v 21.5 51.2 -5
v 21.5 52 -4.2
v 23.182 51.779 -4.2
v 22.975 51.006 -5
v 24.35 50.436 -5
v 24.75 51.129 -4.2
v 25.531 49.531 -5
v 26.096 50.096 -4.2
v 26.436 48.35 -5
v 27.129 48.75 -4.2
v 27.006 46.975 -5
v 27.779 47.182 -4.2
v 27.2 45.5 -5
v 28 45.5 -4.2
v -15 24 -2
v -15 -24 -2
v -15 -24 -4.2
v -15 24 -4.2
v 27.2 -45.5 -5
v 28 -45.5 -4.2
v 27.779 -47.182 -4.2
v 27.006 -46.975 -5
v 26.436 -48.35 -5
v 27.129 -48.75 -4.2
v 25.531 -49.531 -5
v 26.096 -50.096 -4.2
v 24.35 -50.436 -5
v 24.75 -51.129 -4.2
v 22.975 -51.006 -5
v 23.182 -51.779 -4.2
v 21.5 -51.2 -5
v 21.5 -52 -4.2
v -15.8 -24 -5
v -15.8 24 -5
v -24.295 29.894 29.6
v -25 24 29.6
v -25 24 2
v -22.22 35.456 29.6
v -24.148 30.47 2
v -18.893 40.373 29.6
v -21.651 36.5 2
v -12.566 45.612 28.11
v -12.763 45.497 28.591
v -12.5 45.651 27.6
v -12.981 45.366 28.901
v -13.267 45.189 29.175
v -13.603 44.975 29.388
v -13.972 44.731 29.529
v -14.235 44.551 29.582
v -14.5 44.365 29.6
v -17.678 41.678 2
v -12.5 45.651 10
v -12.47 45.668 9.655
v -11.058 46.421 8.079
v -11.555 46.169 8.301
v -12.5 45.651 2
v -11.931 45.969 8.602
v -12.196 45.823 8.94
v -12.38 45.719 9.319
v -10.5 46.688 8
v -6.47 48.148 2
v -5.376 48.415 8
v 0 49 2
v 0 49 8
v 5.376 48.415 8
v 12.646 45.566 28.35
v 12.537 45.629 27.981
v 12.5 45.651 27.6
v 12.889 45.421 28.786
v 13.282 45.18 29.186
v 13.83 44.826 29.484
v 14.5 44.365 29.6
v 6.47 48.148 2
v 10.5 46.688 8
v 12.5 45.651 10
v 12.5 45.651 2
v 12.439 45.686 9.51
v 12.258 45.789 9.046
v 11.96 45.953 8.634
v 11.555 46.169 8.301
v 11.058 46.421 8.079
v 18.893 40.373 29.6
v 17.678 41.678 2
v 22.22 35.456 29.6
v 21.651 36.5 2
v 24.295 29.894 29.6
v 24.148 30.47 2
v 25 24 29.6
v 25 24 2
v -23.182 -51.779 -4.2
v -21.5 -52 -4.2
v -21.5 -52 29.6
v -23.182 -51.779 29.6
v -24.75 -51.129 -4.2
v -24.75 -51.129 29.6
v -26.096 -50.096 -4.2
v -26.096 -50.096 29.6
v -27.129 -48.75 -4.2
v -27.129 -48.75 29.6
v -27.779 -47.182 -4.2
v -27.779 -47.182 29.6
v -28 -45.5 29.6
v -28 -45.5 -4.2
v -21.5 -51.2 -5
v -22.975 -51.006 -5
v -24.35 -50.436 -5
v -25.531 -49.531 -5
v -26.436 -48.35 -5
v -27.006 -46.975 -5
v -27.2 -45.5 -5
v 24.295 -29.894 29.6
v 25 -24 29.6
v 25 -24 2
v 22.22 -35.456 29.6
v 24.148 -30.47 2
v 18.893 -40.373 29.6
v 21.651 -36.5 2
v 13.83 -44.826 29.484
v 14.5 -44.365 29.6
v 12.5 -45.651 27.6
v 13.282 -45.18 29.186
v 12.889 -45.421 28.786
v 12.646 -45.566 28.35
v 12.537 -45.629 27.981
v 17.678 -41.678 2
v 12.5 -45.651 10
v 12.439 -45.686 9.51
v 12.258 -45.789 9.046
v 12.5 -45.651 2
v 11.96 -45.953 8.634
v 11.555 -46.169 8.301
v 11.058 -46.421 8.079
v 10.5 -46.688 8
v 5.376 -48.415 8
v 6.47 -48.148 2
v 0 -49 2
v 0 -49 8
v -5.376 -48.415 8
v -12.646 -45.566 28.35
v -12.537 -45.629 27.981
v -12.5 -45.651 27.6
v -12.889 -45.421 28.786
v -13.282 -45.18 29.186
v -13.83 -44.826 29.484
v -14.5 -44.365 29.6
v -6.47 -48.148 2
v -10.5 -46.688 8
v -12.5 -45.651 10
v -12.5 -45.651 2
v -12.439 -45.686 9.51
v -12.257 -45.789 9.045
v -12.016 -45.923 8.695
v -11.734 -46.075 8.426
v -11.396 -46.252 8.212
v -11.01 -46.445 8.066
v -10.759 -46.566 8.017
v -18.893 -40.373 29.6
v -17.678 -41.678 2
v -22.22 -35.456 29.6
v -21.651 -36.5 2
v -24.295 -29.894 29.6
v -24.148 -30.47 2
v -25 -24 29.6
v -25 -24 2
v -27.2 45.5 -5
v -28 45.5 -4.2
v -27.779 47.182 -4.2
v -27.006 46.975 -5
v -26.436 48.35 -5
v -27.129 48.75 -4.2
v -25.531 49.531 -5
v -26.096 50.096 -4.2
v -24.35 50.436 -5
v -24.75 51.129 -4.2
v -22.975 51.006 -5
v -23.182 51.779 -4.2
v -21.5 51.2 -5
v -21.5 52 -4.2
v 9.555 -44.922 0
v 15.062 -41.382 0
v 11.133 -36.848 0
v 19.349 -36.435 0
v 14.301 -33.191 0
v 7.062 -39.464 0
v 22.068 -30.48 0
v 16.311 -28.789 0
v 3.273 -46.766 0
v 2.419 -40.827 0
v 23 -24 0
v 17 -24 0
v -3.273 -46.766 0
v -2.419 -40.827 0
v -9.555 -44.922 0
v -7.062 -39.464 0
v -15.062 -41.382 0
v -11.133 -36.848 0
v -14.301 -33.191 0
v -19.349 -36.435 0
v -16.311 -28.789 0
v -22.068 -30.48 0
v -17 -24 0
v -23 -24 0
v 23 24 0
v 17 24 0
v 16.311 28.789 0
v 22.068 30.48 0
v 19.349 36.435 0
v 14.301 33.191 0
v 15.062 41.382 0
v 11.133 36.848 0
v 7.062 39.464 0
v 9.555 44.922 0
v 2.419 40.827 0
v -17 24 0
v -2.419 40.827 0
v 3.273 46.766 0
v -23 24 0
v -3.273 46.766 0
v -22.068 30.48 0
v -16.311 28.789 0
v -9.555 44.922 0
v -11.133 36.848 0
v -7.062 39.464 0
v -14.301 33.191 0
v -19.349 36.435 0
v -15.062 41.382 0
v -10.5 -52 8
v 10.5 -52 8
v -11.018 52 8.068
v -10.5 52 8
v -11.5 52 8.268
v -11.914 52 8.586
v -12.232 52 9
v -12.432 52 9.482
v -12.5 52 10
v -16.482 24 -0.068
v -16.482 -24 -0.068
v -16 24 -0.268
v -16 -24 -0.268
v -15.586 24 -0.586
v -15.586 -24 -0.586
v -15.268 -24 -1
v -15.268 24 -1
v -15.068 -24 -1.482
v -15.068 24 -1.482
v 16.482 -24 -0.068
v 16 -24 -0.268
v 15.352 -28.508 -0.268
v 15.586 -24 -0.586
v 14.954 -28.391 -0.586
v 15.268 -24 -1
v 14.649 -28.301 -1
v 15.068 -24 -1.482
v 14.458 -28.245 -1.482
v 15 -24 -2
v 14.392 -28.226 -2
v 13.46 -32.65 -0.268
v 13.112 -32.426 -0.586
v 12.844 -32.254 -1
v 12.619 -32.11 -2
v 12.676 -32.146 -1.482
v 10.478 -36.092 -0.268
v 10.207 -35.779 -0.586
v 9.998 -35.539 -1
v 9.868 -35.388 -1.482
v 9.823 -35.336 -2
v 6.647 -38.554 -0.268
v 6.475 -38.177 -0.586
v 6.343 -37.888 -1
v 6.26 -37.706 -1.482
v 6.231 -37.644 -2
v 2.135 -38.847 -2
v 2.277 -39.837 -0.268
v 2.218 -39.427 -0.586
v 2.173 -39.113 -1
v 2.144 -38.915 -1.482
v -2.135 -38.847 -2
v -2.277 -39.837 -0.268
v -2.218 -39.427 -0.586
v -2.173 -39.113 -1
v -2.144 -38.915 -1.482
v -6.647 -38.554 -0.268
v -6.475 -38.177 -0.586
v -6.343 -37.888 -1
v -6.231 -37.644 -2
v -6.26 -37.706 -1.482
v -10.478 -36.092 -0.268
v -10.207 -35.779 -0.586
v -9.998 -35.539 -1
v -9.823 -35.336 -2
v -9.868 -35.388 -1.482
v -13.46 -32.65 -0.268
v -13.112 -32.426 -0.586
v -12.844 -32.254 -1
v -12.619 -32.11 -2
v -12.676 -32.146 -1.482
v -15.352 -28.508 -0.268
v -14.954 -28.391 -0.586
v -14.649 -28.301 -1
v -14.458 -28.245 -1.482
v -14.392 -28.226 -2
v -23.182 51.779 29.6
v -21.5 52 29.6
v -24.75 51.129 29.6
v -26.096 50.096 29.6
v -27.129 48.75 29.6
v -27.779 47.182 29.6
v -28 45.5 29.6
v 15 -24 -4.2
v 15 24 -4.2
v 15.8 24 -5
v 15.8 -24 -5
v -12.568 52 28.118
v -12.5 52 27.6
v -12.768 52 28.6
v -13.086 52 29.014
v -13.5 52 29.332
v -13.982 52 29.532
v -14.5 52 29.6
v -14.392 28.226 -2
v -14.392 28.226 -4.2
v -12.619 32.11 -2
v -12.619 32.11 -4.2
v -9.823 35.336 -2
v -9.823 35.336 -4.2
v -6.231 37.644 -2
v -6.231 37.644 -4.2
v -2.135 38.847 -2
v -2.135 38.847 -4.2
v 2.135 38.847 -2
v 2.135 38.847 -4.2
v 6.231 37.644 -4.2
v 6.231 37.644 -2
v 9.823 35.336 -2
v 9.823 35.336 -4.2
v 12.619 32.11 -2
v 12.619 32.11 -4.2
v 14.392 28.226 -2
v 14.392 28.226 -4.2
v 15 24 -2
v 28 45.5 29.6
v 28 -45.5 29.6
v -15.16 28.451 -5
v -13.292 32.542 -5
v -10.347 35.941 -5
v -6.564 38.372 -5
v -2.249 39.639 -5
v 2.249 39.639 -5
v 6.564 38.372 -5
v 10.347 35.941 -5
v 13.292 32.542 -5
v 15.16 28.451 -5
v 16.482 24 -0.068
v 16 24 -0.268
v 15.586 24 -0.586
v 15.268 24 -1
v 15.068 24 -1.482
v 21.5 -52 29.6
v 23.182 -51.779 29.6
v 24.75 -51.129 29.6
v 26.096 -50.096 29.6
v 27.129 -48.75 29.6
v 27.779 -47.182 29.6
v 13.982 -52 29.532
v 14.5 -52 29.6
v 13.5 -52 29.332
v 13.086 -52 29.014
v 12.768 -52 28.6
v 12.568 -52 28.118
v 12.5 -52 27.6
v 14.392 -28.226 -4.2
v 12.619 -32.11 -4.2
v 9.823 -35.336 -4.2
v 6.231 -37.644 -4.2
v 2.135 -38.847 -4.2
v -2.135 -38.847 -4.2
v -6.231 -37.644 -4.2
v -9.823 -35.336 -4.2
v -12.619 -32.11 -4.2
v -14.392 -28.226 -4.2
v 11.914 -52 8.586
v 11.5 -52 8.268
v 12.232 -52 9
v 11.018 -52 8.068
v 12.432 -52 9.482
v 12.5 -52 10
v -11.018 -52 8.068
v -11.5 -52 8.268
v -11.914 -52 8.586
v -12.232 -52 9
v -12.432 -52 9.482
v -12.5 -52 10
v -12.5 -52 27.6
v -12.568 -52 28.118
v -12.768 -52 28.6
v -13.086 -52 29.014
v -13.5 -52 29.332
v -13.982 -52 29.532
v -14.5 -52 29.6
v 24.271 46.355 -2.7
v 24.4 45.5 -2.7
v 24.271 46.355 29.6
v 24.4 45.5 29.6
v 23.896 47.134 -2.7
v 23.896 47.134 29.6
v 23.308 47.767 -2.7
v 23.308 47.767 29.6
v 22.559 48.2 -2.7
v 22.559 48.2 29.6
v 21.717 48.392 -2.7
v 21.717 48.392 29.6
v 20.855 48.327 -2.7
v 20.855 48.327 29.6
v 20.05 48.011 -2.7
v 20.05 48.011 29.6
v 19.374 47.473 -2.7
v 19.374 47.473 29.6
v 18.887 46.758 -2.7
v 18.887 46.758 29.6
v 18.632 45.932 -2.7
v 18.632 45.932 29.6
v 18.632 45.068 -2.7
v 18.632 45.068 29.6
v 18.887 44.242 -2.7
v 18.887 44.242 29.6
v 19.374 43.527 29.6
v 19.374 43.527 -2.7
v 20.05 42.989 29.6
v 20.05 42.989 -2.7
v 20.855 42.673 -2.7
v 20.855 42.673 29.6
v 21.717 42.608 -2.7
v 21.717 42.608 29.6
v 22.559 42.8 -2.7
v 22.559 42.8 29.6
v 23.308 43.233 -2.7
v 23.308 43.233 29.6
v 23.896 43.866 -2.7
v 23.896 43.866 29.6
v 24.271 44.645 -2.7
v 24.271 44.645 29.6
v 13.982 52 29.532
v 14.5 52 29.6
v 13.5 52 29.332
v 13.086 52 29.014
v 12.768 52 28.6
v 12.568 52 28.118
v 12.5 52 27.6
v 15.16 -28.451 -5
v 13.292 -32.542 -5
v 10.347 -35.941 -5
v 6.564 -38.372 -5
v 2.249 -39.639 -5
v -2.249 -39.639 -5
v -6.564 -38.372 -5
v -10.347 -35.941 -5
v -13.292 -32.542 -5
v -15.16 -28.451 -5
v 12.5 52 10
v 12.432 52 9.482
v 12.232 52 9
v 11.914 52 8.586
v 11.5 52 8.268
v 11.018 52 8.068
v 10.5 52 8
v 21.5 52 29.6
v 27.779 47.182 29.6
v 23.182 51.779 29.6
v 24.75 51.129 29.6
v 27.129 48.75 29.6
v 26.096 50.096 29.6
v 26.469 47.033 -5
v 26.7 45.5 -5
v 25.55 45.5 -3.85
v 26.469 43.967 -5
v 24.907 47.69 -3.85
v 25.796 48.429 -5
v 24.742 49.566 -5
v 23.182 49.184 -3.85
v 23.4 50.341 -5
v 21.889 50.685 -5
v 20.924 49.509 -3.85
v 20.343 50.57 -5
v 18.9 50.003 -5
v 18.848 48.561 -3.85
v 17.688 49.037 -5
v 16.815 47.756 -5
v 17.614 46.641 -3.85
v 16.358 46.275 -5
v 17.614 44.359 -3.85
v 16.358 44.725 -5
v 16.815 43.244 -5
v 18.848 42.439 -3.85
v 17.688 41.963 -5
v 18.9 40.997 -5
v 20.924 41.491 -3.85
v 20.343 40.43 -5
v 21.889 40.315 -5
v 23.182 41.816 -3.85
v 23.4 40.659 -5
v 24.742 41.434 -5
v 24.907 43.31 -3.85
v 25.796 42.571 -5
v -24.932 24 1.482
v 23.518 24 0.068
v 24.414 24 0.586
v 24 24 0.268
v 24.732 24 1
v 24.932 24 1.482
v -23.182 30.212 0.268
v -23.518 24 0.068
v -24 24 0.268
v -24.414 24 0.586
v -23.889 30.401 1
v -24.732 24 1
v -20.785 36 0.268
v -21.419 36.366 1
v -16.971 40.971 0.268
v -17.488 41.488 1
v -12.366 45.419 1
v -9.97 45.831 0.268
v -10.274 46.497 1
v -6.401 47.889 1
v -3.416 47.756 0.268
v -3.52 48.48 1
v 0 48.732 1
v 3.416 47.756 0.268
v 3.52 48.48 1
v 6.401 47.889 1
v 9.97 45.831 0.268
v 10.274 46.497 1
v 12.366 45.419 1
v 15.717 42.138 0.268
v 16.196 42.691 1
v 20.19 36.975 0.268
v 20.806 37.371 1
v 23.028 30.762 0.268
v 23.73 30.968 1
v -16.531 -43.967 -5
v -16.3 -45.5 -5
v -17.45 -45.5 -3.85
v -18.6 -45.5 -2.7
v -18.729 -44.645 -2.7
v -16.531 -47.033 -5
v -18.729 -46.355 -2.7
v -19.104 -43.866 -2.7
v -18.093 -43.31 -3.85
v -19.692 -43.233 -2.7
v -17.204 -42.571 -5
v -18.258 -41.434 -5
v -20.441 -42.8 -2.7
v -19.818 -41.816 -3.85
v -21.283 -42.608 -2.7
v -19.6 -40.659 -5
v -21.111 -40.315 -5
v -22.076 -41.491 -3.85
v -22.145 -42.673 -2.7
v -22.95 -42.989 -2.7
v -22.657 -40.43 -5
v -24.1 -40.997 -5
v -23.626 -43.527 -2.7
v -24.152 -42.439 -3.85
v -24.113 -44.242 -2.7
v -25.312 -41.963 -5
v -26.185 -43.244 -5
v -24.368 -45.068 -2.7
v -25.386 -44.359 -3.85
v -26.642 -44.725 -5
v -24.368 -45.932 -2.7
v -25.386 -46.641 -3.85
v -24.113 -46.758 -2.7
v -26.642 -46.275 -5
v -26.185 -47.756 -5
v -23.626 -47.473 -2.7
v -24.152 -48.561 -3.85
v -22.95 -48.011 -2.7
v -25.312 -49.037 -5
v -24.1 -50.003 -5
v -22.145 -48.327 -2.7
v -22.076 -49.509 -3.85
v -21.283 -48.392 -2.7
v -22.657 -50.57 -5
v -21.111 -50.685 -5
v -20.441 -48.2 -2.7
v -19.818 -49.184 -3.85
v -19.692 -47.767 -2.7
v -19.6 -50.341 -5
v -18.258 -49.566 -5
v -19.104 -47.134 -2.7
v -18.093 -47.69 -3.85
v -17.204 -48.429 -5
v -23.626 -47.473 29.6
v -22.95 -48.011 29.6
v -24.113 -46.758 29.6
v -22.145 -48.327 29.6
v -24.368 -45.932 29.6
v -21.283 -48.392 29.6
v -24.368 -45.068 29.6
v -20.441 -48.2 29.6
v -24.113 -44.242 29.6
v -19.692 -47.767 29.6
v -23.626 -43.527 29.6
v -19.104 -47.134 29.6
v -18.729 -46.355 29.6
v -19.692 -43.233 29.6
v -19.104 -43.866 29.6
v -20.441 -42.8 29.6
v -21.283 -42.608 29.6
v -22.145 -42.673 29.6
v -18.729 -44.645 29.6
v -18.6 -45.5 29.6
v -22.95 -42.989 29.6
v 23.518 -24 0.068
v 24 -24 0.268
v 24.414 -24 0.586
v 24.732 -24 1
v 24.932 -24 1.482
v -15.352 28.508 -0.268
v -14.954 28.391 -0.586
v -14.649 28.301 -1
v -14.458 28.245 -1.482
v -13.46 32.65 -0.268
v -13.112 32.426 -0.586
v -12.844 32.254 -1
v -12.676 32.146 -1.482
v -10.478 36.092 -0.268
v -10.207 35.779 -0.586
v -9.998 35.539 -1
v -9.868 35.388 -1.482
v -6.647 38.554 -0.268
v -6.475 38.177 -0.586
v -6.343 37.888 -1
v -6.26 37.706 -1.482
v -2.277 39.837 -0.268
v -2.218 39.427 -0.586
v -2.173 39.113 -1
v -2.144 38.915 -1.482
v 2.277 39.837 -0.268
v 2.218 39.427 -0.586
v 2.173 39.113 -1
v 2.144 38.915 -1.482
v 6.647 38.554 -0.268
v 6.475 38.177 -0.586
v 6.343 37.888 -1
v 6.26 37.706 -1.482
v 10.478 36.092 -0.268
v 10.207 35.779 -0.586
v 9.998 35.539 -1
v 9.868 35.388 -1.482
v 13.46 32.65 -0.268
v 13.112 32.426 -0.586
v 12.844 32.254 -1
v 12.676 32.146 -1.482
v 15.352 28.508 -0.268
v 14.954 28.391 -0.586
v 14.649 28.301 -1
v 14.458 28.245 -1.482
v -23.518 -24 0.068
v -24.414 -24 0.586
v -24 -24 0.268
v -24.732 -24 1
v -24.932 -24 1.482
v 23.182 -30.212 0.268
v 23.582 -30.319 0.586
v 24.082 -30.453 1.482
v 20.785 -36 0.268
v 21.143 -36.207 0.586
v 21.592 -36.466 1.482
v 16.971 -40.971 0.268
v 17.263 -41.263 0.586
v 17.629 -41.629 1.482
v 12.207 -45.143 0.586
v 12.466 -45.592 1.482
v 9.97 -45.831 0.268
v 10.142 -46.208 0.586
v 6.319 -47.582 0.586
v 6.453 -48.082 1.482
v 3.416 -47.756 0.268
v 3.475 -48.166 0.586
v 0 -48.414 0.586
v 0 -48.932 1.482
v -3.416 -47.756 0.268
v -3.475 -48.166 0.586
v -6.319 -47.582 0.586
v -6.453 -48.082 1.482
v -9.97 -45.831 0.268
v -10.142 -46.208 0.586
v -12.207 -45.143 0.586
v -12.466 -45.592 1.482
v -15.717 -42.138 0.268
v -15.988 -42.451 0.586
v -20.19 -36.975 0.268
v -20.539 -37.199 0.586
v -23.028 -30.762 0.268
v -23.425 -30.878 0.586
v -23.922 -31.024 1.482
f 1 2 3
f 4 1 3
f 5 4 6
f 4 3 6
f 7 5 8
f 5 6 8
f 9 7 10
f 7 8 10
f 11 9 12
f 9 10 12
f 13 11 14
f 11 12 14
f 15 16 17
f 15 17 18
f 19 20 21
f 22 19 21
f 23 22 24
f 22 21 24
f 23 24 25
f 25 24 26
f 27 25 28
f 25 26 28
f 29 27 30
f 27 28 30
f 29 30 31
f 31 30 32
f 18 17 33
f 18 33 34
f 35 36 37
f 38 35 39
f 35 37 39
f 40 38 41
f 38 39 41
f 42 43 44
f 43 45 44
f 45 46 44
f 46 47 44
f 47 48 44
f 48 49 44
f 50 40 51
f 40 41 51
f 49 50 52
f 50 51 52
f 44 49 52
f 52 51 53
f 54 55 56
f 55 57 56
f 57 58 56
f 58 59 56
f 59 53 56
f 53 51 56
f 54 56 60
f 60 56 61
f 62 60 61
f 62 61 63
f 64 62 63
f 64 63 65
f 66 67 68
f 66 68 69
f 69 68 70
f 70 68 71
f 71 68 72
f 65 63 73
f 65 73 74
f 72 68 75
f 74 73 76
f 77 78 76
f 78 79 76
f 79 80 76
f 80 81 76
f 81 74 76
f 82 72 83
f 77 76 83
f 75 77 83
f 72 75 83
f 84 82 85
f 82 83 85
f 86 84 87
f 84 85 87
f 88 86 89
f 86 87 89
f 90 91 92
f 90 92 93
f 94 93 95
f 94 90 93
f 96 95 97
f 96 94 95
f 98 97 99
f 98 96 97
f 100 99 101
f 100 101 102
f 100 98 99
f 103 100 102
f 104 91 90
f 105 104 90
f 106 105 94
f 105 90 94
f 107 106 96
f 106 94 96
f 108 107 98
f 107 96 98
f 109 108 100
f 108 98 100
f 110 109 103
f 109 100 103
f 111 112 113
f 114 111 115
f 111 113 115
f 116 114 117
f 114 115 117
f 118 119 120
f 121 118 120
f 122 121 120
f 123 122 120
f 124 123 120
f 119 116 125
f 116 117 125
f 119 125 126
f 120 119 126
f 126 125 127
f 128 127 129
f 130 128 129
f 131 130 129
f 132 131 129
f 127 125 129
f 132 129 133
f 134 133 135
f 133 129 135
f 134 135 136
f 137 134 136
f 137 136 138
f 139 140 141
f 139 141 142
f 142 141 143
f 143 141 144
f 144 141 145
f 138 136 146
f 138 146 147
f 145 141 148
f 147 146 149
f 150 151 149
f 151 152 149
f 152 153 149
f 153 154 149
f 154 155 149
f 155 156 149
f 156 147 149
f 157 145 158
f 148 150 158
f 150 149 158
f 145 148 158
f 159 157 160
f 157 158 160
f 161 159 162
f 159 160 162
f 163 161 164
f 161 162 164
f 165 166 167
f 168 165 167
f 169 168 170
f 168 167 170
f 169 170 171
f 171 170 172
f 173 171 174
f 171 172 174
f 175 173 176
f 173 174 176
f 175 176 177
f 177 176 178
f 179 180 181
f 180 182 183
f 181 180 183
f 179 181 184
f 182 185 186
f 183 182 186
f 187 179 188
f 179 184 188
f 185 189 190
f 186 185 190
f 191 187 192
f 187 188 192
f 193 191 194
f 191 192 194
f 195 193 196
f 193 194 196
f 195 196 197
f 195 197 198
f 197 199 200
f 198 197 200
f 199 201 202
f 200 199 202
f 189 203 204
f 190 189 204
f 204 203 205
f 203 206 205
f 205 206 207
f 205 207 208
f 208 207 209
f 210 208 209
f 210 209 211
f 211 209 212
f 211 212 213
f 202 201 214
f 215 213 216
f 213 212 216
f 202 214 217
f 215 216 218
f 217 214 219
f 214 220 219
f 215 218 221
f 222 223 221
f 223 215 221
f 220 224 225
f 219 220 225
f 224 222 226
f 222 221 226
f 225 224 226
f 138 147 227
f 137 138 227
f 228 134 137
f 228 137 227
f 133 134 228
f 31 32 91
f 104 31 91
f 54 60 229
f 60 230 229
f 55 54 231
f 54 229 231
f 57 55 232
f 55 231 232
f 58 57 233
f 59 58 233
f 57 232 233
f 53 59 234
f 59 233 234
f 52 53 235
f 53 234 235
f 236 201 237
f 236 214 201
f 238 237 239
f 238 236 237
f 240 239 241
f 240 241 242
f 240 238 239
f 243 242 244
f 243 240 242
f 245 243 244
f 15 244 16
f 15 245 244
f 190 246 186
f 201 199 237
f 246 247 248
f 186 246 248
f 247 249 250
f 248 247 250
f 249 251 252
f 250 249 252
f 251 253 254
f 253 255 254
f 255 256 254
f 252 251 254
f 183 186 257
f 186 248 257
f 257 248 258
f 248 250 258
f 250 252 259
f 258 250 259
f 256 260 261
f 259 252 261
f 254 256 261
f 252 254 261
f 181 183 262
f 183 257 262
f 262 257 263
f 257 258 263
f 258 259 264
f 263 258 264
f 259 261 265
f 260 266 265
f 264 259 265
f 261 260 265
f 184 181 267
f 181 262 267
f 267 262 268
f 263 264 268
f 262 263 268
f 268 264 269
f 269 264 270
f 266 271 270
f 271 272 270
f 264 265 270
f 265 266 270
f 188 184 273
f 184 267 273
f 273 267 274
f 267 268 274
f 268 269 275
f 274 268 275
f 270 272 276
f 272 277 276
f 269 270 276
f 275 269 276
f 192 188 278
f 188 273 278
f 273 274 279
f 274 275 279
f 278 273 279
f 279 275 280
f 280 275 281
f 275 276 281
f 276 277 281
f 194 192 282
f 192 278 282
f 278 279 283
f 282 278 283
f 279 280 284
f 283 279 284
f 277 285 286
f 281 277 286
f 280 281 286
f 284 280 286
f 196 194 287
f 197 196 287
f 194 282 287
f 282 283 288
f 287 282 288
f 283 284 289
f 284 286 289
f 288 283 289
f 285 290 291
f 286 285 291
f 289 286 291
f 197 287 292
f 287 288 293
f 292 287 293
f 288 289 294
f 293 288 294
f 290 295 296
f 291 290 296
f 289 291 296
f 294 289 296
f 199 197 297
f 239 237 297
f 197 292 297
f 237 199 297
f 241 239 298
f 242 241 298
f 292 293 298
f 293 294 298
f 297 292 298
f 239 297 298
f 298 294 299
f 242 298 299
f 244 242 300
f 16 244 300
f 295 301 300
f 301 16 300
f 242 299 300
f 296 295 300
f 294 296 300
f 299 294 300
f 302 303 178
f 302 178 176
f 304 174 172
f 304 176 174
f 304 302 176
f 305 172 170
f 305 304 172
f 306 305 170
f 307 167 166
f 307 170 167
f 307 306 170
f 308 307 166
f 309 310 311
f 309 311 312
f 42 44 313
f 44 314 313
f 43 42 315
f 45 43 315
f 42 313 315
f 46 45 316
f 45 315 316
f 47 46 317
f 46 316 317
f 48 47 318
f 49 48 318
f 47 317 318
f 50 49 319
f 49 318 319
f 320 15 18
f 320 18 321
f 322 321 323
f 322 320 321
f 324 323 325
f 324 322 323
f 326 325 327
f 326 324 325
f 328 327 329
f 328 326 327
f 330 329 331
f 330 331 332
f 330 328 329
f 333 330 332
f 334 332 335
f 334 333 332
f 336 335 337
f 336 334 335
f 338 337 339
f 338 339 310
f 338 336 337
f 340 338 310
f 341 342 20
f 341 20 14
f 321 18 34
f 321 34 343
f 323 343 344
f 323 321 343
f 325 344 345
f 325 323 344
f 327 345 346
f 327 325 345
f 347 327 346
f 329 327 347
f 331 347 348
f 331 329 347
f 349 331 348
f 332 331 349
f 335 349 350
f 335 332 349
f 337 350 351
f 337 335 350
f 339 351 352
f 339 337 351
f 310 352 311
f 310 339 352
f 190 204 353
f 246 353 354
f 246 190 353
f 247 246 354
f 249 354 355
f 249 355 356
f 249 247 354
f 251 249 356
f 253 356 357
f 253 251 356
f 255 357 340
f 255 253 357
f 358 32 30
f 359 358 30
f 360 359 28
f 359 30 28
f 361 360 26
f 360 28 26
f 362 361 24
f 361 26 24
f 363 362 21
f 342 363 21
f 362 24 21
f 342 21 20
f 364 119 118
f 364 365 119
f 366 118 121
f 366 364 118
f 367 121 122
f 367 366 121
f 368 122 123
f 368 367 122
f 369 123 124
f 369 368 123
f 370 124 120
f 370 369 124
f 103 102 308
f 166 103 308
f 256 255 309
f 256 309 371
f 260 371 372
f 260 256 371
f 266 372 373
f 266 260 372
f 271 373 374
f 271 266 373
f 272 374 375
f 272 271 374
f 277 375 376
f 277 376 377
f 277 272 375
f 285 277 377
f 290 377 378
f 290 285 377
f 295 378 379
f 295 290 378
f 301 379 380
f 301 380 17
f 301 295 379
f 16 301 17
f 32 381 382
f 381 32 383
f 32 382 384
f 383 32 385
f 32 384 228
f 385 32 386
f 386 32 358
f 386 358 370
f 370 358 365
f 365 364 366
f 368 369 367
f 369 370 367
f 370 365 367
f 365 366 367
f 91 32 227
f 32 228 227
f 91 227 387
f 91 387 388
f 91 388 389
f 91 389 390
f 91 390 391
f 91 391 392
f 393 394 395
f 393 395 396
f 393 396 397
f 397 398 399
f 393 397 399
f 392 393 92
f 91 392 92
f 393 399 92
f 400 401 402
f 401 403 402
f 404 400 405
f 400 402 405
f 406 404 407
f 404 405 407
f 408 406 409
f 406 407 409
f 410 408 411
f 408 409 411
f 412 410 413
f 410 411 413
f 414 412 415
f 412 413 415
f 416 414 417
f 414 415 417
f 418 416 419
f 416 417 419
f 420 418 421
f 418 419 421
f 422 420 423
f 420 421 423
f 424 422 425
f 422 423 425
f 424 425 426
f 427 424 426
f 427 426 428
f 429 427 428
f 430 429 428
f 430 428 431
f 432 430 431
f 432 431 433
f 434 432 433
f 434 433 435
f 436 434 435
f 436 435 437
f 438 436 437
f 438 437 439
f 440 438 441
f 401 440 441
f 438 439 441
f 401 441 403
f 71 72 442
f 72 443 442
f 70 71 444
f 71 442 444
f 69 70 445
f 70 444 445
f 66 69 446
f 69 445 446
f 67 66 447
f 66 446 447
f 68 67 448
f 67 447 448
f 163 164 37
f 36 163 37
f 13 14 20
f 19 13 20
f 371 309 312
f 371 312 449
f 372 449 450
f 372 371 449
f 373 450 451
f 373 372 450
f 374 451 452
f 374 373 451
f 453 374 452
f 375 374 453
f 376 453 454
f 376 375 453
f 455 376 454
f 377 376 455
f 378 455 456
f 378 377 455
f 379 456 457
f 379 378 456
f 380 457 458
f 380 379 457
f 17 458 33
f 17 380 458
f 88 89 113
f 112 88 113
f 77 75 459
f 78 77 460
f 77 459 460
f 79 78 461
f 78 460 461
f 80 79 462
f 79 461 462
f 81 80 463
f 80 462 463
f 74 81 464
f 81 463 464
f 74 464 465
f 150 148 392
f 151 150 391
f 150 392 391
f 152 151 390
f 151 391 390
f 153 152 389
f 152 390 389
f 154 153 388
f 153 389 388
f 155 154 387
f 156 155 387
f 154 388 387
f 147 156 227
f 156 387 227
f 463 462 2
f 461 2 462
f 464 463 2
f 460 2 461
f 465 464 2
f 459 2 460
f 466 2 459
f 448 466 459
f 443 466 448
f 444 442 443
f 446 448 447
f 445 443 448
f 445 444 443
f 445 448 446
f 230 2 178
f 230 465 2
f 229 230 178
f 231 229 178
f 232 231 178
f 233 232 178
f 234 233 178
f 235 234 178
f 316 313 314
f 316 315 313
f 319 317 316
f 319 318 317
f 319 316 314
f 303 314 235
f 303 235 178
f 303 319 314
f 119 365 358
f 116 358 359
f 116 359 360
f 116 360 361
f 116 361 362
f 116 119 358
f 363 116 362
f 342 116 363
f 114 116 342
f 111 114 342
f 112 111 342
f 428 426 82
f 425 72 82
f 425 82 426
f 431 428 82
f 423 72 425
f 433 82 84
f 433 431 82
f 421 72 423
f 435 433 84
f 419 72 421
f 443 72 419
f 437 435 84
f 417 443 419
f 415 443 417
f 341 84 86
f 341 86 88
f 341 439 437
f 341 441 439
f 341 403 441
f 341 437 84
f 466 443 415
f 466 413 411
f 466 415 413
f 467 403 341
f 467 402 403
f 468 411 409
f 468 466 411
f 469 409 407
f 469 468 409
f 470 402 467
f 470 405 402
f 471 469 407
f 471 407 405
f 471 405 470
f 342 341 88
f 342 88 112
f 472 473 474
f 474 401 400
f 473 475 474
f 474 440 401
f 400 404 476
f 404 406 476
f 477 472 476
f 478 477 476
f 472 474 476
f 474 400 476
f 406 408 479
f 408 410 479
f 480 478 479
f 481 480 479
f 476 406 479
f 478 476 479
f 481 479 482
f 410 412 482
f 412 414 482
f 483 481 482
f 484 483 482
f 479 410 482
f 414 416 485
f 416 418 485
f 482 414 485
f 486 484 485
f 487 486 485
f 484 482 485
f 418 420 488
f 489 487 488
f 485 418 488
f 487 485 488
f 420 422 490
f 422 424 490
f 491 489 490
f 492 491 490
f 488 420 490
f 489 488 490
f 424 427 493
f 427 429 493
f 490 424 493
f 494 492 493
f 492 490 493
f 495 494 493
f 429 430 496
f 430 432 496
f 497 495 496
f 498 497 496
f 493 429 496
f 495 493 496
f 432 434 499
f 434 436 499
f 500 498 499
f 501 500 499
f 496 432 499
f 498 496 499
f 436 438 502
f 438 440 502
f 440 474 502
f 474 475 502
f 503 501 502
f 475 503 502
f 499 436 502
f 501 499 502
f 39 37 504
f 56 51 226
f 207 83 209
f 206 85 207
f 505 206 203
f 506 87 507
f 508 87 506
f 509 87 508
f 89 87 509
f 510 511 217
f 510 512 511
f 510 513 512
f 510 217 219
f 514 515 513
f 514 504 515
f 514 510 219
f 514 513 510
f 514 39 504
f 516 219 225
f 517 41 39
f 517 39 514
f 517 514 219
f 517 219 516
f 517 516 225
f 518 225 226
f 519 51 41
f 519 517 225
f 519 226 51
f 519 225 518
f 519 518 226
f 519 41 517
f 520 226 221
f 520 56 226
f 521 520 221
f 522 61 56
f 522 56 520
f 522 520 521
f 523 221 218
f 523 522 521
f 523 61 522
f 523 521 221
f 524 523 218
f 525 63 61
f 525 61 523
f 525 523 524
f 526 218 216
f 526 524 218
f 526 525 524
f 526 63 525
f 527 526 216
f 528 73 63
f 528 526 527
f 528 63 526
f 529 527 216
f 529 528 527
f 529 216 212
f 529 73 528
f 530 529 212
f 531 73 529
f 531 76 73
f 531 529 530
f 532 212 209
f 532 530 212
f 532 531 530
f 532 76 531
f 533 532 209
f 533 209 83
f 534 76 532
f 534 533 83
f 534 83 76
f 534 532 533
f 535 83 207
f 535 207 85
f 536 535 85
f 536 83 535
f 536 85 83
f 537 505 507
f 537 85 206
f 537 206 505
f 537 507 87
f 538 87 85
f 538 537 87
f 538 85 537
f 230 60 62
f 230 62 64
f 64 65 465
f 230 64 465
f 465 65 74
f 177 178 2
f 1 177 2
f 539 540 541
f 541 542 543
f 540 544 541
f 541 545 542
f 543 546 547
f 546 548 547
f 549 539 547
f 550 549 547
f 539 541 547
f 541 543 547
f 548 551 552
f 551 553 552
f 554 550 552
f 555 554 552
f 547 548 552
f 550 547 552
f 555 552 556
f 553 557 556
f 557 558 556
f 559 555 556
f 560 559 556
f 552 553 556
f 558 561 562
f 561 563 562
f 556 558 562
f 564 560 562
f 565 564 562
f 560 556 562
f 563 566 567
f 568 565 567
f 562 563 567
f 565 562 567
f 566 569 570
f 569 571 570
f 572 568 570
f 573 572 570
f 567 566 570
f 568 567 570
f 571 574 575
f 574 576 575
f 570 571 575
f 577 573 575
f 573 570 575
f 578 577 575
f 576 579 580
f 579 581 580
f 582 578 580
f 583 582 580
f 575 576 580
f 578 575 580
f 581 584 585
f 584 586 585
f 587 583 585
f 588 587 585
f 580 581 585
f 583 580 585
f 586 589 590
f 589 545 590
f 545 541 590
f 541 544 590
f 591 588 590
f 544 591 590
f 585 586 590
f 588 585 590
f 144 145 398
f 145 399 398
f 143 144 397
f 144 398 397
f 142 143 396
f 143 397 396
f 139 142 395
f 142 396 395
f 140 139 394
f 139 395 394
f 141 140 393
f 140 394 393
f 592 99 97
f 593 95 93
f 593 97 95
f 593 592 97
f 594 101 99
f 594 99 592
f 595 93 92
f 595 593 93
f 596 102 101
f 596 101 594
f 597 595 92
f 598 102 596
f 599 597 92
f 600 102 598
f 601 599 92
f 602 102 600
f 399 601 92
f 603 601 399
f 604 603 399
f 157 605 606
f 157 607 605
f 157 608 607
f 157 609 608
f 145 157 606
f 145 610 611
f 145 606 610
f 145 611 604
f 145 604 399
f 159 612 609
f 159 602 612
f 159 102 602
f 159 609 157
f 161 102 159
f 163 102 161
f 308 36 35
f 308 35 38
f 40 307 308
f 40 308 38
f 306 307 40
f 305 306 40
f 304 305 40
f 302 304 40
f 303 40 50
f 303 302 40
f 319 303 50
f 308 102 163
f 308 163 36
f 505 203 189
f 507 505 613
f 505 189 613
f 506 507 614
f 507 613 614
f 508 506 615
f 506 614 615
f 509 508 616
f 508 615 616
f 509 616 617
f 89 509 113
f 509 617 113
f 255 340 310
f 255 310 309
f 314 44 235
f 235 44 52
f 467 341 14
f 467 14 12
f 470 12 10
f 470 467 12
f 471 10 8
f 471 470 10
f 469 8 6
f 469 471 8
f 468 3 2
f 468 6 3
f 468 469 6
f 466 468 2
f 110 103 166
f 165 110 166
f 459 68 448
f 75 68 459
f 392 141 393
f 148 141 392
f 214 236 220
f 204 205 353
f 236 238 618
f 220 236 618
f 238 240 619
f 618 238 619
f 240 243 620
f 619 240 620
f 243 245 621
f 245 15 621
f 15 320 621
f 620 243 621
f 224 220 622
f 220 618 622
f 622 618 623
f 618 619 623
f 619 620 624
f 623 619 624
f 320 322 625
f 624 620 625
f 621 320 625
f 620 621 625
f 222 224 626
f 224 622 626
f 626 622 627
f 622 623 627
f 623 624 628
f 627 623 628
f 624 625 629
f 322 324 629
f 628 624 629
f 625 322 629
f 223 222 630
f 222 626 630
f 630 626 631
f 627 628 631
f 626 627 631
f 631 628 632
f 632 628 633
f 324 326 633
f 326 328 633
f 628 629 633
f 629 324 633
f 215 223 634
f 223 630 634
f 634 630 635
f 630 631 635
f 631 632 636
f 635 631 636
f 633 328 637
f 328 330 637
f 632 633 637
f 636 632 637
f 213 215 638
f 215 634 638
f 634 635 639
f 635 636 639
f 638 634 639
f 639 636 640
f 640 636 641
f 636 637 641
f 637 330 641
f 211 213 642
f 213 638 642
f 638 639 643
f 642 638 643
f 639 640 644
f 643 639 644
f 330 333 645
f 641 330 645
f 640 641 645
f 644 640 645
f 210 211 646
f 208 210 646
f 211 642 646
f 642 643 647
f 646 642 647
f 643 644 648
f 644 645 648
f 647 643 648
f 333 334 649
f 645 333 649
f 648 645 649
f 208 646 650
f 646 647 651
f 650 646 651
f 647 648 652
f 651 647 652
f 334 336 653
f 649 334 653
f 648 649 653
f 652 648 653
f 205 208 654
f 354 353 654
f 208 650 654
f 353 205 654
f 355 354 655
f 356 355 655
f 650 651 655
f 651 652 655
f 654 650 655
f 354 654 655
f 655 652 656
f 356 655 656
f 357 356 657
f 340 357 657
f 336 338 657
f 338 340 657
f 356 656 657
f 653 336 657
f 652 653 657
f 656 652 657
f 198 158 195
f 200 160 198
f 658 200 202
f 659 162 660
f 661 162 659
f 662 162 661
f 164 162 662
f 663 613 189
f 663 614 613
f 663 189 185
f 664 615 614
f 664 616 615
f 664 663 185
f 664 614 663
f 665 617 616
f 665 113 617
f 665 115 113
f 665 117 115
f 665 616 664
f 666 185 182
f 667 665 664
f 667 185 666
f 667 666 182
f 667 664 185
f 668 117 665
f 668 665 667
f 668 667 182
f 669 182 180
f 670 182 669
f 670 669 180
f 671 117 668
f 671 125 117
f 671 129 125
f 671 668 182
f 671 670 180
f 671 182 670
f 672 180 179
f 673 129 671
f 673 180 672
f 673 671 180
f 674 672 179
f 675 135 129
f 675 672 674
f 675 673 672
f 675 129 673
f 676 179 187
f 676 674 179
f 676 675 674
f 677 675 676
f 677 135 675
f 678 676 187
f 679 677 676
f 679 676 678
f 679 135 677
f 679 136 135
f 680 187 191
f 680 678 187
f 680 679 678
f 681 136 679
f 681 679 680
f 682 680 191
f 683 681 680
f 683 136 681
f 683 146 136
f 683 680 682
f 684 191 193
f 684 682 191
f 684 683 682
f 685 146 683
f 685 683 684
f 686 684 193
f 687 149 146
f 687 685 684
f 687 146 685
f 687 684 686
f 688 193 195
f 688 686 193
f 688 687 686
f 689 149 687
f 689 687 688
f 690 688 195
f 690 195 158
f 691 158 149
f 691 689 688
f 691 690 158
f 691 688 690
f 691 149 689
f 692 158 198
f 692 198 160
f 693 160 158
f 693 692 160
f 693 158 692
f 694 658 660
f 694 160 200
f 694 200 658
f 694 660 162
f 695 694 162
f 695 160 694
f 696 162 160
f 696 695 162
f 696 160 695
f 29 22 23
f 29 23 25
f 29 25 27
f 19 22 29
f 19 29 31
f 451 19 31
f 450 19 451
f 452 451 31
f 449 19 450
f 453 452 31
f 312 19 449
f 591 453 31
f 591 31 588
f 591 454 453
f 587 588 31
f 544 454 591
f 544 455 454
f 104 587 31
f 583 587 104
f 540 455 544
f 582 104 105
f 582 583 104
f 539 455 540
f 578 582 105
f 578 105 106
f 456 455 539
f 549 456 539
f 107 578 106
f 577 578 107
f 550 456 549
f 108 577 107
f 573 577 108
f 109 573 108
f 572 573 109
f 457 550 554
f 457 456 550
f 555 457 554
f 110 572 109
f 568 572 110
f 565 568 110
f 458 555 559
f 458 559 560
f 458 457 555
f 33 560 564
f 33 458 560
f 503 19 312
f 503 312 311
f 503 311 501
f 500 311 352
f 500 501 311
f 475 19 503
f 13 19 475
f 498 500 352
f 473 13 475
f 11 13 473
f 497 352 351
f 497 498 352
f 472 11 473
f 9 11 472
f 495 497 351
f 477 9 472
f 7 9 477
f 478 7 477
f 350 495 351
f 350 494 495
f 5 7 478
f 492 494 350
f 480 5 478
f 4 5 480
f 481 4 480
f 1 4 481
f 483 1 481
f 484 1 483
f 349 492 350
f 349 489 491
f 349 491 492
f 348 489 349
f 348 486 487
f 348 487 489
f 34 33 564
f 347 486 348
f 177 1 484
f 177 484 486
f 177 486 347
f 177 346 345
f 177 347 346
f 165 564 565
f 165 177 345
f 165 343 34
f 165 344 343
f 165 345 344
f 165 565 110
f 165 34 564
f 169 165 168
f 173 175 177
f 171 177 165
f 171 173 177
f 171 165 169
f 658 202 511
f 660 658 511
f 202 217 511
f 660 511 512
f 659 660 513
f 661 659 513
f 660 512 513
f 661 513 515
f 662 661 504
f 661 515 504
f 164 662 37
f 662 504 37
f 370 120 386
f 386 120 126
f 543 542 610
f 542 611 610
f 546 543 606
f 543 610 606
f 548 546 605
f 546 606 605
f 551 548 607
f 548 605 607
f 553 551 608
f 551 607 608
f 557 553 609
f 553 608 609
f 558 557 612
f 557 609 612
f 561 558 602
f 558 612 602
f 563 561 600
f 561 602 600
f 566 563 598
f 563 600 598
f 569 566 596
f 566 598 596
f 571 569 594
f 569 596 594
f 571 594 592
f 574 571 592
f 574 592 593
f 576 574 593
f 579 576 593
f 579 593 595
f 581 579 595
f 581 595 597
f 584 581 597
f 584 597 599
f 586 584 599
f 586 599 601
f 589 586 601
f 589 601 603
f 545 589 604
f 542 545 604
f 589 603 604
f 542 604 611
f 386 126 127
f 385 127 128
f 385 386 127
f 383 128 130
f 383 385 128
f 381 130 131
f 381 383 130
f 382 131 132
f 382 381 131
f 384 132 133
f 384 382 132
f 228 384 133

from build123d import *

# Parameters (mm, degrees)
SKETCH1_W                                       = 56
SKETCH1_H                                       = 104
BOSS_EXTRUDE1_DEPTH                             = 29.6
SKETCH2_W                                       = 56
SKETCH2_H                                       = 104
BOSS_EXTRUDE2_DEPTH                             = 5
FILLET1_R                                       = 2
SKETCH3_W                                       = 25
SKETCH3_H                                       = 21.6
CUT_EXTRUDE1_DEPTH                              = 53
CUT_EXTRUDE1_DEPTH_BACK                         = 53
FILLET2_R                                       = 2
FILLET3_R                                       = 6.5
CSK_FOR_M5_FLAT_HEAD_MACHINE_SCREW1_D           = 5.8
CSK_FOR_M5_FLAT_HEAD_MACHINE_SCREW1_CSINK_D     = 10.4
CSK_FOR_M5_FLAT_HEAD_MACHINE_SCREW1_CSINK_ANGLE = 90
CHAMFER1_SIZE                                   = 0.8


with BuildPart() as part:
    # Sketch1 → Boss-Extrude1 (new body)
    with BuildSketch(Plane.XY):
        Rectangle(SKETCH1_W, SKETCH1_H)
        with BuildLine():
            Line((25, 24), (25, -24))
            ThreePointArc((25, -24), (0, -49), (-25, -24))
            Line((-25, -24), (-25, 24))
            ThreePointArc((-25, 24), (0, 49), (25, 24))
        make_face(mode=Mode.SUBTRACT)
    extrude(amount=BOSS_EXTRUDE1_DEPTH)

    # Sketch2 → Boss-Extrude2 (add)
    with BuildSketch(Plane(origin=(0, 0, 0), x_dir=(-1, 0, 0), z_dir=(0, 0, -1))):
        Rectangle(SKETCH2_W, SKETCH2_H)
        with BuildLine():
            Line((-15, 24), (-15, -24))
            ThreePointArc((-15, -24), (0, -39), (15, -24))
            Line((15, -24), (15, 24))
            ThreePointArc((15, 24), (0, 39), (-15, 24))
        make_face(mode=Mode.SUBTRACT)
    extrude(amount=BOSS_EXTRUDE2_DEPTH)

    # Fillet1
    fillet1_edges = [part.edges().sort_by_distance(p)[0] for p in [
        (0, 49, 0),
        (-25, 0, 0),
        (0, -49, 0),
        (25, 0, 0),
        (0, 39, 0),
        (15, 0, 0),
        (0, -39, 0),
        (-15, 0, 0),
    ]]
    fillet(fillet1_edges, radius=FILLET1_R)

    # Sketch3 → Cut-Extrude1 (cut, two sides)
    with BuildSketch(Plane(origin=(0, 0, 0), x_dir=(1, 0, 0), z_dir=(0, 1, 0))) as cut_extrude1_sk:
        with Locations((0, -18.8)):
            Rectangle(SKETCH3_W, SKETCH3_H)
    extrude(amount=CUT_EXTRUDE1_DEPTH, mode=Mode.SUBTRACT)
    extrude(cut_extrude1_sk.sketch, amount=-CUT_EXTRUDE1_DEPTH_BACK, mode=Mode.SUBTRACT)

    # Fillet2
    fillet2_edges = [part.edges().sort_by_distance(p)[0] for p in [
        (-12.5, 48.825317547, 29.6),
        (-12.5, 48.825317547, 8),
        (12.5, 48.825317547, 8),
        (12.5, 48.825317547, 29.6),
        (-12.5, -48.825317547, 29.6),
        (-12.5, -48.825317547, 8),
        (12.5, -48.825317547, 8),
        (12.5, -48.825317547, 29.6),
    ]]
    fillet(fillet2_edges, radius=FILLET2_R)

    # Fillet3
    fillet3_edges = [part.edges().sort_by_distance(p)[0] for p in [
        (28, -52, 12.3),
        (-28, -52, 12.3),
        (-28, 52, 12.3),
        (28, 52, 12.3),
    ]]
    fillet(fillet3_edges, radius=FILLET3_R)

    # CSK for M5 Flat Head Machine Screw1 (through all)
    with Locations(Plane(origin=(21.5, 45.5, -5), x_dir=(-1, 0, 0), z_dir=(0, 0, -1))):
        with Locations((0, 0), (43, -91)):
            CounterSinkHole(CSK_FOR_M5_FLAT_HEAD_MACHINE_SCREW1_D / 2, CSK_FOR_M5_FLAT_HEAD_MACHINE_SCREW1_CSINK_D / 2, counter_sink_angle=CSK_FOR_M5_FLAT_HEAD_MACHINE_SCREW1_CSINK_ANGLE)

    # Chamfer1
    chamfer1_edges = [part.edges().sort_by_distance(p)[0] for p in [
        (-28, 0, -5),
        (0, 52, -5),
        (28, 0, -5),
        (0, -52, -5),
        (26.096194078, -50.096194078, -5),
        (26.096194078, 50.096194078, -5),
        (-26.096194078, -50.096194078, -5),
        (-26.096194078, 50.096194078, -5),
        (0, 39, -5),
        (15, 0, -5),
        (0, -39, -5),
        (-15, 0, -5),
    ]]
    chamfer(chamfer1_edges, length=CHAMFER1_SIZE)


solid = part.part
